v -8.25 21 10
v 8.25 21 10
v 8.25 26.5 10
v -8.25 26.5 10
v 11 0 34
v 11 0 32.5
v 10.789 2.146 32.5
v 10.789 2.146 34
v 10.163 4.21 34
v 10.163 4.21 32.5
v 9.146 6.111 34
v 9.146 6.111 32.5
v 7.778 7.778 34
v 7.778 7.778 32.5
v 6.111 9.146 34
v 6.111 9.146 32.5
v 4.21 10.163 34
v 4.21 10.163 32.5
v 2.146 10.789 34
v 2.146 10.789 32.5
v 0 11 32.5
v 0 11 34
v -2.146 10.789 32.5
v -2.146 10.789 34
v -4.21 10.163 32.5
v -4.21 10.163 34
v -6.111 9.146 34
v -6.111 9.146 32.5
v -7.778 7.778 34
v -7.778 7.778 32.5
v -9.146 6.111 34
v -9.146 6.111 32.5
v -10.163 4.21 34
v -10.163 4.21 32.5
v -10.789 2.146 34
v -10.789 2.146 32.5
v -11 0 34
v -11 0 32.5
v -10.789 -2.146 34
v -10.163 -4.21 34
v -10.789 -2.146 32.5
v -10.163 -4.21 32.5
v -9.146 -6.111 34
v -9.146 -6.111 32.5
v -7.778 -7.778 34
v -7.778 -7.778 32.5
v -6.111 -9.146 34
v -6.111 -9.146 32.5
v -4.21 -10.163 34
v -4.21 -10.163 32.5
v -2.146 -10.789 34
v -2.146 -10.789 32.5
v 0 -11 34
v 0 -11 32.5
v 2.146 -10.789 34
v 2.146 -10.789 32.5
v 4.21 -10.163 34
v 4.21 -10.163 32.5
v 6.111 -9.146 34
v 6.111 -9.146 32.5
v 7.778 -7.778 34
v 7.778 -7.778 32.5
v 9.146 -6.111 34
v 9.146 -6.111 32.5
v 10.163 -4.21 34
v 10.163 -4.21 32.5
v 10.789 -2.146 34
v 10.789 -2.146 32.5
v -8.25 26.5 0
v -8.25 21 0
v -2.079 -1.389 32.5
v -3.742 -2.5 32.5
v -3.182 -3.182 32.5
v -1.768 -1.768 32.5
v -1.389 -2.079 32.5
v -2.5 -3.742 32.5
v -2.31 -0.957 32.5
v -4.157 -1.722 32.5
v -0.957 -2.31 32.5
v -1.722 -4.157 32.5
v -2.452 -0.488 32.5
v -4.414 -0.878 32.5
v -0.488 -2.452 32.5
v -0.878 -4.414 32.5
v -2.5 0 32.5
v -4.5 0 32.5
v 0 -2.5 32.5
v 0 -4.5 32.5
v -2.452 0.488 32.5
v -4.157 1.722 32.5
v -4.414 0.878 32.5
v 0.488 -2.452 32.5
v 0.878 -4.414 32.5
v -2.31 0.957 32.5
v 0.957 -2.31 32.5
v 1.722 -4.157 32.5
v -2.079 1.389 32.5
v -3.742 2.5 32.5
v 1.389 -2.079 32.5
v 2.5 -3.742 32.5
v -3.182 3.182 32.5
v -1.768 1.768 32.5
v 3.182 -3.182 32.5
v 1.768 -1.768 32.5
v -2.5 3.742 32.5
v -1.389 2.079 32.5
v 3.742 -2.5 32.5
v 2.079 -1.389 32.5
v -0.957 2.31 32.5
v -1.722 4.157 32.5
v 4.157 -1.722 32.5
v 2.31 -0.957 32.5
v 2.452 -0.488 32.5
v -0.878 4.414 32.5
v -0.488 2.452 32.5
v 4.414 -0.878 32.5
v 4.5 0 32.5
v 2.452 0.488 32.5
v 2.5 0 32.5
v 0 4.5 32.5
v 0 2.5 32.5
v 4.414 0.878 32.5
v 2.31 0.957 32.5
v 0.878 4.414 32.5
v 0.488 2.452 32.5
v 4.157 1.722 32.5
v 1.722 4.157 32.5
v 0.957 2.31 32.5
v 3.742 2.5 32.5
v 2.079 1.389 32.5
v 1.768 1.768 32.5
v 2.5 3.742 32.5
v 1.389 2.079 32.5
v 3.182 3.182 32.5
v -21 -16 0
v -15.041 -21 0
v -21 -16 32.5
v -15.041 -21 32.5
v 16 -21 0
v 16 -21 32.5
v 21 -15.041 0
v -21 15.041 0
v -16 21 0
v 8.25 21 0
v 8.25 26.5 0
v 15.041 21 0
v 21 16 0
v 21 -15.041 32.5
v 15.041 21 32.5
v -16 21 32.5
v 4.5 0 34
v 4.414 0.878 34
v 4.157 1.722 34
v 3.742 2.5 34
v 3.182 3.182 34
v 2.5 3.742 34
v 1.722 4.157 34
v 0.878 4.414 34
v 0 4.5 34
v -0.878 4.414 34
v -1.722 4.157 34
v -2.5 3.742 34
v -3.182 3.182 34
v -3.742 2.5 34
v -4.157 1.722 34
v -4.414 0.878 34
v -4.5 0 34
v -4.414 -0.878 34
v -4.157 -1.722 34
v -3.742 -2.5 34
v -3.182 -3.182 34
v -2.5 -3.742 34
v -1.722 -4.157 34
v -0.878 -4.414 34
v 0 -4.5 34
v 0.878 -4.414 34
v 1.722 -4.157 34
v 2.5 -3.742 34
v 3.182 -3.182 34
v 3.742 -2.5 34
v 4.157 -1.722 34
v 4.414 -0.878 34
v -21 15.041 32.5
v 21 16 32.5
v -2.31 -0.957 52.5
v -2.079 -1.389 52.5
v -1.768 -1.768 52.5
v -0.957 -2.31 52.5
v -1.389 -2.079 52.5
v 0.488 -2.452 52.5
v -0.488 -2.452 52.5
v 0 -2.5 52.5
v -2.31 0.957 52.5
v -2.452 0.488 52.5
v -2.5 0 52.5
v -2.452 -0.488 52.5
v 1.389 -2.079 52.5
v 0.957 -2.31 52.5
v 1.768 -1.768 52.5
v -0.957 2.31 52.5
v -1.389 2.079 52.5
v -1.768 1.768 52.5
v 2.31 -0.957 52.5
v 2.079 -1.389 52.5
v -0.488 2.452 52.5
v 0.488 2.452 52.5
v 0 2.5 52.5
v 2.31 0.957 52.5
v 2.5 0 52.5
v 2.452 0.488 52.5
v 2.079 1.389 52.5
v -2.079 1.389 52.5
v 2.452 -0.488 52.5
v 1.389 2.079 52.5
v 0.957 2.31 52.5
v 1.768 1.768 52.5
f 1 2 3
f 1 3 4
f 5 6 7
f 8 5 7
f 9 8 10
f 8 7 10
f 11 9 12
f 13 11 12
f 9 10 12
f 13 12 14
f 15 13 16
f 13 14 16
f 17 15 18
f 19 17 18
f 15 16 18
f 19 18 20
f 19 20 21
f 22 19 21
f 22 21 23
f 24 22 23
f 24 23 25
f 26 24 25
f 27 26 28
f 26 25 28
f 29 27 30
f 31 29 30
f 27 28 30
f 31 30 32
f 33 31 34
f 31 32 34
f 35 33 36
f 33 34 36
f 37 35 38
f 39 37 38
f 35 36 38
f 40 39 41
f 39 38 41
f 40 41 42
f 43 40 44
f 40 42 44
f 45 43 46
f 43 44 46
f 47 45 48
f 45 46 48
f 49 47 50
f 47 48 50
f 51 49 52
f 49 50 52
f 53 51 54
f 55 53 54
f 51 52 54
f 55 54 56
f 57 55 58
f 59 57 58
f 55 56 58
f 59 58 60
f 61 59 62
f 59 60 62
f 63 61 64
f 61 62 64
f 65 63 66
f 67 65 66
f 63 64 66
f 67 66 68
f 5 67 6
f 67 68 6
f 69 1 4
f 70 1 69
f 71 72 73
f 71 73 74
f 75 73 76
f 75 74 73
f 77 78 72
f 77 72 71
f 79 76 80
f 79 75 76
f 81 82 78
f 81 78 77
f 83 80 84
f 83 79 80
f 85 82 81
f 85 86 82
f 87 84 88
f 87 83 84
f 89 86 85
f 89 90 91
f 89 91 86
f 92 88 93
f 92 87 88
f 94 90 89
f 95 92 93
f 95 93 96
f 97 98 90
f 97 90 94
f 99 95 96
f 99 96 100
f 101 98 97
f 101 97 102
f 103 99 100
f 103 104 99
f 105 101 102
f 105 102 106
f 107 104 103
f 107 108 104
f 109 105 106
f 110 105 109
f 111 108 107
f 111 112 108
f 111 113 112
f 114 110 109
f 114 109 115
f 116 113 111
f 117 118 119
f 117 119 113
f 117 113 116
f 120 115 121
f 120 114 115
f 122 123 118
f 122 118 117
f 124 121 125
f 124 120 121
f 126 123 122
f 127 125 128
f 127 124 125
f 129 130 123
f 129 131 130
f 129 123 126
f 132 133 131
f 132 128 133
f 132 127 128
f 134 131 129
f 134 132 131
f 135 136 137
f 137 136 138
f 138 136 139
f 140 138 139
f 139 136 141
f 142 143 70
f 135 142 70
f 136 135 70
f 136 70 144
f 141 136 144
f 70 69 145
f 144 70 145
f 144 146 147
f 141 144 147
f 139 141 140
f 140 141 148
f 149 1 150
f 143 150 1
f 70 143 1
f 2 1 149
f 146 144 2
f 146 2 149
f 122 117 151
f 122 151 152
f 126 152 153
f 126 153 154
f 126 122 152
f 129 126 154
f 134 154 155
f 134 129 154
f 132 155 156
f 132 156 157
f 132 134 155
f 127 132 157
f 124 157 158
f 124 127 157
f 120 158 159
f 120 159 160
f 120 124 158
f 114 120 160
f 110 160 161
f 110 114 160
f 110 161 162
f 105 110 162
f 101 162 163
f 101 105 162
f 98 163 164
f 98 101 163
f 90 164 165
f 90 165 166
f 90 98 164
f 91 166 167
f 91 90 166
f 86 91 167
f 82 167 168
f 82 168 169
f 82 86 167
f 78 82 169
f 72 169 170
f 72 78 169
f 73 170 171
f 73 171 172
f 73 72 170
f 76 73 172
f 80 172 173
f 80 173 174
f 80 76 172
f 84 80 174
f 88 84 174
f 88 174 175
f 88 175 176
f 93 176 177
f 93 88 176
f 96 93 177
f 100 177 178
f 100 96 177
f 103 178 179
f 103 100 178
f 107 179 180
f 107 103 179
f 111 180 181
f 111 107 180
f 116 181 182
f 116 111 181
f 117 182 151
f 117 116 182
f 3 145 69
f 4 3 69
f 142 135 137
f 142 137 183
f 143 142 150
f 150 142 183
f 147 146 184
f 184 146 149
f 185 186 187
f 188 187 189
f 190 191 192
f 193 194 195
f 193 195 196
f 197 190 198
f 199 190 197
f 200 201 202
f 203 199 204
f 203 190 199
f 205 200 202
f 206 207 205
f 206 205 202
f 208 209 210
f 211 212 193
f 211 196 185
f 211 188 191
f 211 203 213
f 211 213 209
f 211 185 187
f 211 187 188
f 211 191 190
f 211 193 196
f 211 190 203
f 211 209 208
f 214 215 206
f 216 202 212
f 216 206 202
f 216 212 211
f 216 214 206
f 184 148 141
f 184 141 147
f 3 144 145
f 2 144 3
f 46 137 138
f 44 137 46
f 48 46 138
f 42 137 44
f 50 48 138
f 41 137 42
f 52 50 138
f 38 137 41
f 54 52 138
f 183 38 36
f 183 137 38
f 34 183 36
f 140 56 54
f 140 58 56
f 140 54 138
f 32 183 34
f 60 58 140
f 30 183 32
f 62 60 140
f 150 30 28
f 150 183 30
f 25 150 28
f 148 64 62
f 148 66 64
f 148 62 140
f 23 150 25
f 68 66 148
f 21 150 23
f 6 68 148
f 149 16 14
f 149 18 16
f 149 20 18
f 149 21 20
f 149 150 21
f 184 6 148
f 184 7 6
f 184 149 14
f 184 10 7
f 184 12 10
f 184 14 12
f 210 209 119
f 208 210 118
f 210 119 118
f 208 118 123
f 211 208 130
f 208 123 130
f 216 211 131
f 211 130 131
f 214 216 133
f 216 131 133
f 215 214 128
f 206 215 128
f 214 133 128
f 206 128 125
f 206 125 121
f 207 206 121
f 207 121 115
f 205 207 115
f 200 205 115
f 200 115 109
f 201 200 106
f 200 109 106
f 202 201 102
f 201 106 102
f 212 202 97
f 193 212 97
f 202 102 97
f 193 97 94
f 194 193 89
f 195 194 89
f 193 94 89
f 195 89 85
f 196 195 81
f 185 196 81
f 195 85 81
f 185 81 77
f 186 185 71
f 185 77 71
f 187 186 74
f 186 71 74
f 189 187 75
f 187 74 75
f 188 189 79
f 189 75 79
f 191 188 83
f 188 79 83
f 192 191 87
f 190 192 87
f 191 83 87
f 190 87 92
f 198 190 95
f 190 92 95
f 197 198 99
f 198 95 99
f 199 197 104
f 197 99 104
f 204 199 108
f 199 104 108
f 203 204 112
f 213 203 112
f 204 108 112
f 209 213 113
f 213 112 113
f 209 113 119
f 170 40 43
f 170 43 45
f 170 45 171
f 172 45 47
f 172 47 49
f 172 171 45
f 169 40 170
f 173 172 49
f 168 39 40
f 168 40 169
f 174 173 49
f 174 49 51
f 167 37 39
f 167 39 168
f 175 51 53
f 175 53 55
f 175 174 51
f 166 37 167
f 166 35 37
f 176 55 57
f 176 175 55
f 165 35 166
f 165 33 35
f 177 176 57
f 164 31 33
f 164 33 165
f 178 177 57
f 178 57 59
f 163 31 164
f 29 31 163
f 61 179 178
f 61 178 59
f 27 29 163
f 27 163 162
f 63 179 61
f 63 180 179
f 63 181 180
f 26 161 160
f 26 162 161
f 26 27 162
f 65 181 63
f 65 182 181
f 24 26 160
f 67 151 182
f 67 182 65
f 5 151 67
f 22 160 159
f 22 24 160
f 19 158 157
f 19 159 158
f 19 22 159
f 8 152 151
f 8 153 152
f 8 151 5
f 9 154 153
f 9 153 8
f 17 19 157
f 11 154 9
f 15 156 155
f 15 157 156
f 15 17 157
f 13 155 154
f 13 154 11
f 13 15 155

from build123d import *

# Parameters (mm, degrees)
ESQUISSE1_W             = 42
ESQUISSE1_H             = 42
BOSS_EXTRU_1_DEPTH      = 32.5
CHANFREIN1_SIZE         = 5
CHANFREIN1_SIZE2        = 5.958767963
CHANFREIN1_PART_2_SIZE  = 5
CHANFREIN1_PART_2_SIZE2 = 5.958767963
CHANFREIN1_PART_3_SIZE  = 5
CHANFREIN1_PART_3_SIZE2 = 5.958767963
CHANFREIN1_PART_4_SIZE  = 5
CHANFREIN1_PART_4_SIZE2 = 5.958767963
ESQUISSE2_R             = 11
ESQUISSE2_R_2           = 4.5
BOSS_EXTRU_2_DEPTH      = 1.5
ESQUISSE3_R             = 2.5
BOSS_EXTRU_3_DEPTH      = 20
BOSS_EXTRU_4_DEPTH      = 5.5


with BuildPart() as part:
    # Esquisse1 → Boss.-Extru.1 (new body)
    with BuildSketch(Plane.XY):
        Rectangle(ESQUISSE1_W, ESQUISSE1_H)
    extrude(amount=BOSS_EXTRU_1_DEPTH)

    # Chanfrein1
    chanfrein1_edges = [part.edges().sort_by_distance(p)[0] for p in [
        (21, -21, 16.25),
    ]]
    chanfrein1_side = [part.faces().sort_by_distance(p)[0] for p in [
        (0, -21, 16.25),
    ]]
    chamfer(chanfrein1_edges, length=CHANFREIN1_SIZE, length2=CHANFREIN1_SIZE2, reference=chanfrein1_side[0])

    # Chanfrein1 part 2
    chanfrein1_part_2_edges = [part.edges().sort_by_distance(p)[0] for p in [
        (-21, -21, 16.25),
    ]]
    chanfrein1_part_2_side = [part.faces().sort_by_distance(p)[0] for p in [
        (-21, 0, 16.25),
    ]]
    chamfer(chanfrein1_part_2_edges, length=CHANFREIN1_PART_2_SIZE, length2=CHANFREIN1_PART_2_SIZE2, reference=chanfrein1_part_2_side[0])

    # Chanfrein1 part 3
    chanfrein1_part_3_edges = [part.edges().sort_by_distance(p)[0] for p in [
        (-21, 21, 16.25),
    ]]
    chanfrein1_part_3_side = [part.faces().sort_by_distance(p)[0] for p in [
        (0, 21, 16.25),
    ]]
    chamfer(chanfrein1_part_3_edges, length=CHANFREIN1_PART_3_SIZE, length2=CHANFREIN1_PART_3_SIZE2, reference=chanfrein1_part_3_side[0])

    # Chanfrein1 part 4
    chanfrein1_part_4_edges = [part.edges().sort_by_distance(p)[0] for p in [
        (21, 21, 16.25),
    ]]
    chanfrein1_part_4_side = [part.faces().sort_by_distance(p)[0] for p in [
        (21, 0, 16.25),
    ]]
    chamfer(chanfrein1_part_4_edges, length=CHANFREIN1_PART_4_SIZE, length2=CHANFREIN1_PART_4_SIZE2, reference=chanfrein1_part_4_side[0])

    # Esquisse2 → Boss.-Extru.2 (add)
    with BuildSketch(Plane.XY.offset(32.5)):
        Circle(ESQUISSE2_R)
        Circle(ESQUISSE2_R_2, mode=Mode.SUBTRACT)
    extrude(amount=BOSS_EXTRU_2_DEPTH)

    # Esquisse3 → Boss.-Extru.3 (add)
    with BuildSketch(Plane.XY.offset(32.5)):
        Circle(ESQUISSE3_R)
    extrude(amount=BOSS_EXTRU_3_DEPTH)

    # Esquisse4 → Boss.-Extru.4 (add)
    with BuildSketch(Plane(origin=(0, 21, 0), x_dir=(1, 0, 0), z_dir=(0, 1, 0))):
        Polygon((0, 0), (8.25, 0), (8.25, -10), (-8.25, -10), (-8.25, 0), align=None)
    extrude(amount=BOSS_EXTRU_4_DEPTH)


solid = part.part
